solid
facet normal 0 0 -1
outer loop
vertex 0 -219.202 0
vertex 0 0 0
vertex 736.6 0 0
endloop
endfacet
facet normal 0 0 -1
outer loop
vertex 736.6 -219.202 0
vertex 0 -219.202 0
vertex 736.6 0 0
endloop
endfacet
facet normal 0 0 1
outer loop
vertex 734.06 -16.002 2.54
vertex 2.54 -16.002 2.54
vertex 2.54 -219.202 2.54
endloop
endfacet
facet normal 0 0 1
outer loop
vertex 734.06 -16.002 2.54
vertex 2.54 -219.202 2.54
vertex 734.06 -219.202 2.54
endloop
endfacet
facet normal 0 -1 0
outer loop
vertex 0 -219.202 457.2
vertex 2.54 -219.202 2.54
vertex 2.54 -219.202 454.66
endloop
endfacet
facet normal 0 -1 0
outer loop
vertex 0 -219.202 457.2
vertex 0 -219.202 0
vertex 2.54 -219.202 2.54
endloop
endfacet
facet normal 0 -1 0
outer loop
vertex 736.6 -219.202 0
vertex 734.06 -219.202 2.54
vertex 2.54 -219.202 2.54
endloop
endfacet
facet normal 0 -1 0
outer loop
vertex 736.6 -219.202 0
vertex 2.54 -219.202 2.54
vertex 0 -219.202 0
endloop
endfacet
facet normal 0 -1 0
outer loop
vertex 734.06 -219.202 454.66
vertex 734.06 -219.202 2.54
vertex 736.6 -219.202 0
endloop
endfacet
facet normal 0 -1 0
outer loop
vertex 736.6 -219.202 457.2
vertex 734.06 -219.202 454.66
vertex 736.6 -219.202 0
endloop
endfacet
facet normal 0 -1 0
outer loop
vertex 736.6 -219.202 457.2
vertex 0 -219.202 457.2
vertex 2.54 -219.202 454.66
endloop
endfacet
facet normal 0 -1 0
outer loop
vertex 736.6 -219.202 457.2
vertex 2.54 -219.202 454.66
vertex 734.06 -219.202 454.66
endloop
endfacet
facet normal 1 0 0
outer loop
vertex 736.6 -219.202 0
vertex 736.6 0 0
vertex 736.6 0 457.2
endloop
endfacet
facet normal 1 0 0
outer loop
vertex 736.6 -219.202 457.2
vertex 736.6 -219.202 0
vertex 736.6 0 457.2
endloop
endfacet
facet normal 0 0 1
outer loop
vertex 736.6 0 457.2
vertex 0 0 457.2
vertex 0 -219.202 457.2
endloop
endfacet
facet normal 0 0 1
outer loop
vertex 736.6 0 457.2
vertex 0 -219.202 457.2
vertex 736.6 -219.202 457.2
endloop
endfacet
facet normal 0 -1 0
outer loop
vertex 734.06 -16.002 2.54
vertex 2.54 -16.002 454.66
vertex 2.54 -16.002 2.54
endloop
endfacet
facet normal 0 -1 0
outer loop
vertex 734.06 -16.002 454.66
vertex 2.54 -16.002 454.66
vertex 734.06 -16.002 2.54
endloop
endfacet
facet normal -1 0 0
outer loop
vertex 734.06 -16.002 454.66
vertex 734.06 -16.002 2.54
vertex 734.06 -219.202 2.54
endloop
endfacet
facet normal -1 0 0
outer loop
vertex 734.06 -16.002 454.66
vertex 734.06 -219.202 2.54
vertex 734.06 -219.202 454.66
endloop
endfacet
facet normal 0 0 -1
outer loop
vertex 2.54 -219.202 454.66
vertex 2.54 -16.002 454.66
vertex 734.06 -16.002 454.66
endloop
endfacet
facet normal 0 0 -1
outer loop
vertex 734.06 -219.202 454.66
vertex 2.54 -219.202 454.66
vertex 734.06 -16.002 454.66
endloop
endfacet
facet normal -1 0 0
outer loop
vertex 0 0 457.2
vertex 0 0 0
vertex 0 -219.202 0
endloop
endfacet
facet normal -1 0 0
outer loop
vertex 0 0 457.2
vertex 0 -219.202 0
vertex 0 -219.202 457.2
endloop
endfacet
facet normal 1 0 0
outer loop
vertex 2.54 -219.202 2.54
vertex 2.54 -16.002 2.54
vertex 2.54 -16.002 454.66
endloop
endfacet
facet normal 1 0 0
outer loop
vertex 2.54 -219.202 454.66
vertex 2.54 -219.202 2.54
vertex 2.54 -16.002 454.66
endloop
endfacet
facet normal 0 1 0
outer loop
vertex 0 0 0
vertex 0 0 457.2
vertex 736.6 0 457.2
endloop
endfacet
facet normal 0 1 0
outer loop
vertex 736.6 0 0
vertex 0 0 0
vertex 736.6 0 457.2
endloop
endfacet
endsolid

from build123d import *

# Parameters (mm, degrees)
F0_W     = 736.6
F0_H     = 457.2
F2_DEPTH = 219.202
F3_T     = -2.54
F1_W     = 736.6
F1_H     = 457.2
F4_DEPTH = 16.002


with BuildPart() as f2:
    # F0 (on Front) → F2 (new body)
    with BuildSketch(Plane.XZ):
        with Locations((368.3, 228.6)):
            Rectangle(F0_W, F0_H)
    extrude(amount=F2_DEPTH)

    # F3
    f3_openings = [f2.faces().sort_by_distance(p)[0] for p in [
        (368.3, -219.202, 228.6),
    ]]
    offset(amount=F3_T, openings=f3_openings)

    # F1 (on Front) → F4 (join)
    with BuildSketch(Plane.XZ):
        with Locations((368.3, 228.6)):
            Rectangle(F1_W, F1_H)
    extrude(amount=F4_DEPTH)


solid = f2.part
